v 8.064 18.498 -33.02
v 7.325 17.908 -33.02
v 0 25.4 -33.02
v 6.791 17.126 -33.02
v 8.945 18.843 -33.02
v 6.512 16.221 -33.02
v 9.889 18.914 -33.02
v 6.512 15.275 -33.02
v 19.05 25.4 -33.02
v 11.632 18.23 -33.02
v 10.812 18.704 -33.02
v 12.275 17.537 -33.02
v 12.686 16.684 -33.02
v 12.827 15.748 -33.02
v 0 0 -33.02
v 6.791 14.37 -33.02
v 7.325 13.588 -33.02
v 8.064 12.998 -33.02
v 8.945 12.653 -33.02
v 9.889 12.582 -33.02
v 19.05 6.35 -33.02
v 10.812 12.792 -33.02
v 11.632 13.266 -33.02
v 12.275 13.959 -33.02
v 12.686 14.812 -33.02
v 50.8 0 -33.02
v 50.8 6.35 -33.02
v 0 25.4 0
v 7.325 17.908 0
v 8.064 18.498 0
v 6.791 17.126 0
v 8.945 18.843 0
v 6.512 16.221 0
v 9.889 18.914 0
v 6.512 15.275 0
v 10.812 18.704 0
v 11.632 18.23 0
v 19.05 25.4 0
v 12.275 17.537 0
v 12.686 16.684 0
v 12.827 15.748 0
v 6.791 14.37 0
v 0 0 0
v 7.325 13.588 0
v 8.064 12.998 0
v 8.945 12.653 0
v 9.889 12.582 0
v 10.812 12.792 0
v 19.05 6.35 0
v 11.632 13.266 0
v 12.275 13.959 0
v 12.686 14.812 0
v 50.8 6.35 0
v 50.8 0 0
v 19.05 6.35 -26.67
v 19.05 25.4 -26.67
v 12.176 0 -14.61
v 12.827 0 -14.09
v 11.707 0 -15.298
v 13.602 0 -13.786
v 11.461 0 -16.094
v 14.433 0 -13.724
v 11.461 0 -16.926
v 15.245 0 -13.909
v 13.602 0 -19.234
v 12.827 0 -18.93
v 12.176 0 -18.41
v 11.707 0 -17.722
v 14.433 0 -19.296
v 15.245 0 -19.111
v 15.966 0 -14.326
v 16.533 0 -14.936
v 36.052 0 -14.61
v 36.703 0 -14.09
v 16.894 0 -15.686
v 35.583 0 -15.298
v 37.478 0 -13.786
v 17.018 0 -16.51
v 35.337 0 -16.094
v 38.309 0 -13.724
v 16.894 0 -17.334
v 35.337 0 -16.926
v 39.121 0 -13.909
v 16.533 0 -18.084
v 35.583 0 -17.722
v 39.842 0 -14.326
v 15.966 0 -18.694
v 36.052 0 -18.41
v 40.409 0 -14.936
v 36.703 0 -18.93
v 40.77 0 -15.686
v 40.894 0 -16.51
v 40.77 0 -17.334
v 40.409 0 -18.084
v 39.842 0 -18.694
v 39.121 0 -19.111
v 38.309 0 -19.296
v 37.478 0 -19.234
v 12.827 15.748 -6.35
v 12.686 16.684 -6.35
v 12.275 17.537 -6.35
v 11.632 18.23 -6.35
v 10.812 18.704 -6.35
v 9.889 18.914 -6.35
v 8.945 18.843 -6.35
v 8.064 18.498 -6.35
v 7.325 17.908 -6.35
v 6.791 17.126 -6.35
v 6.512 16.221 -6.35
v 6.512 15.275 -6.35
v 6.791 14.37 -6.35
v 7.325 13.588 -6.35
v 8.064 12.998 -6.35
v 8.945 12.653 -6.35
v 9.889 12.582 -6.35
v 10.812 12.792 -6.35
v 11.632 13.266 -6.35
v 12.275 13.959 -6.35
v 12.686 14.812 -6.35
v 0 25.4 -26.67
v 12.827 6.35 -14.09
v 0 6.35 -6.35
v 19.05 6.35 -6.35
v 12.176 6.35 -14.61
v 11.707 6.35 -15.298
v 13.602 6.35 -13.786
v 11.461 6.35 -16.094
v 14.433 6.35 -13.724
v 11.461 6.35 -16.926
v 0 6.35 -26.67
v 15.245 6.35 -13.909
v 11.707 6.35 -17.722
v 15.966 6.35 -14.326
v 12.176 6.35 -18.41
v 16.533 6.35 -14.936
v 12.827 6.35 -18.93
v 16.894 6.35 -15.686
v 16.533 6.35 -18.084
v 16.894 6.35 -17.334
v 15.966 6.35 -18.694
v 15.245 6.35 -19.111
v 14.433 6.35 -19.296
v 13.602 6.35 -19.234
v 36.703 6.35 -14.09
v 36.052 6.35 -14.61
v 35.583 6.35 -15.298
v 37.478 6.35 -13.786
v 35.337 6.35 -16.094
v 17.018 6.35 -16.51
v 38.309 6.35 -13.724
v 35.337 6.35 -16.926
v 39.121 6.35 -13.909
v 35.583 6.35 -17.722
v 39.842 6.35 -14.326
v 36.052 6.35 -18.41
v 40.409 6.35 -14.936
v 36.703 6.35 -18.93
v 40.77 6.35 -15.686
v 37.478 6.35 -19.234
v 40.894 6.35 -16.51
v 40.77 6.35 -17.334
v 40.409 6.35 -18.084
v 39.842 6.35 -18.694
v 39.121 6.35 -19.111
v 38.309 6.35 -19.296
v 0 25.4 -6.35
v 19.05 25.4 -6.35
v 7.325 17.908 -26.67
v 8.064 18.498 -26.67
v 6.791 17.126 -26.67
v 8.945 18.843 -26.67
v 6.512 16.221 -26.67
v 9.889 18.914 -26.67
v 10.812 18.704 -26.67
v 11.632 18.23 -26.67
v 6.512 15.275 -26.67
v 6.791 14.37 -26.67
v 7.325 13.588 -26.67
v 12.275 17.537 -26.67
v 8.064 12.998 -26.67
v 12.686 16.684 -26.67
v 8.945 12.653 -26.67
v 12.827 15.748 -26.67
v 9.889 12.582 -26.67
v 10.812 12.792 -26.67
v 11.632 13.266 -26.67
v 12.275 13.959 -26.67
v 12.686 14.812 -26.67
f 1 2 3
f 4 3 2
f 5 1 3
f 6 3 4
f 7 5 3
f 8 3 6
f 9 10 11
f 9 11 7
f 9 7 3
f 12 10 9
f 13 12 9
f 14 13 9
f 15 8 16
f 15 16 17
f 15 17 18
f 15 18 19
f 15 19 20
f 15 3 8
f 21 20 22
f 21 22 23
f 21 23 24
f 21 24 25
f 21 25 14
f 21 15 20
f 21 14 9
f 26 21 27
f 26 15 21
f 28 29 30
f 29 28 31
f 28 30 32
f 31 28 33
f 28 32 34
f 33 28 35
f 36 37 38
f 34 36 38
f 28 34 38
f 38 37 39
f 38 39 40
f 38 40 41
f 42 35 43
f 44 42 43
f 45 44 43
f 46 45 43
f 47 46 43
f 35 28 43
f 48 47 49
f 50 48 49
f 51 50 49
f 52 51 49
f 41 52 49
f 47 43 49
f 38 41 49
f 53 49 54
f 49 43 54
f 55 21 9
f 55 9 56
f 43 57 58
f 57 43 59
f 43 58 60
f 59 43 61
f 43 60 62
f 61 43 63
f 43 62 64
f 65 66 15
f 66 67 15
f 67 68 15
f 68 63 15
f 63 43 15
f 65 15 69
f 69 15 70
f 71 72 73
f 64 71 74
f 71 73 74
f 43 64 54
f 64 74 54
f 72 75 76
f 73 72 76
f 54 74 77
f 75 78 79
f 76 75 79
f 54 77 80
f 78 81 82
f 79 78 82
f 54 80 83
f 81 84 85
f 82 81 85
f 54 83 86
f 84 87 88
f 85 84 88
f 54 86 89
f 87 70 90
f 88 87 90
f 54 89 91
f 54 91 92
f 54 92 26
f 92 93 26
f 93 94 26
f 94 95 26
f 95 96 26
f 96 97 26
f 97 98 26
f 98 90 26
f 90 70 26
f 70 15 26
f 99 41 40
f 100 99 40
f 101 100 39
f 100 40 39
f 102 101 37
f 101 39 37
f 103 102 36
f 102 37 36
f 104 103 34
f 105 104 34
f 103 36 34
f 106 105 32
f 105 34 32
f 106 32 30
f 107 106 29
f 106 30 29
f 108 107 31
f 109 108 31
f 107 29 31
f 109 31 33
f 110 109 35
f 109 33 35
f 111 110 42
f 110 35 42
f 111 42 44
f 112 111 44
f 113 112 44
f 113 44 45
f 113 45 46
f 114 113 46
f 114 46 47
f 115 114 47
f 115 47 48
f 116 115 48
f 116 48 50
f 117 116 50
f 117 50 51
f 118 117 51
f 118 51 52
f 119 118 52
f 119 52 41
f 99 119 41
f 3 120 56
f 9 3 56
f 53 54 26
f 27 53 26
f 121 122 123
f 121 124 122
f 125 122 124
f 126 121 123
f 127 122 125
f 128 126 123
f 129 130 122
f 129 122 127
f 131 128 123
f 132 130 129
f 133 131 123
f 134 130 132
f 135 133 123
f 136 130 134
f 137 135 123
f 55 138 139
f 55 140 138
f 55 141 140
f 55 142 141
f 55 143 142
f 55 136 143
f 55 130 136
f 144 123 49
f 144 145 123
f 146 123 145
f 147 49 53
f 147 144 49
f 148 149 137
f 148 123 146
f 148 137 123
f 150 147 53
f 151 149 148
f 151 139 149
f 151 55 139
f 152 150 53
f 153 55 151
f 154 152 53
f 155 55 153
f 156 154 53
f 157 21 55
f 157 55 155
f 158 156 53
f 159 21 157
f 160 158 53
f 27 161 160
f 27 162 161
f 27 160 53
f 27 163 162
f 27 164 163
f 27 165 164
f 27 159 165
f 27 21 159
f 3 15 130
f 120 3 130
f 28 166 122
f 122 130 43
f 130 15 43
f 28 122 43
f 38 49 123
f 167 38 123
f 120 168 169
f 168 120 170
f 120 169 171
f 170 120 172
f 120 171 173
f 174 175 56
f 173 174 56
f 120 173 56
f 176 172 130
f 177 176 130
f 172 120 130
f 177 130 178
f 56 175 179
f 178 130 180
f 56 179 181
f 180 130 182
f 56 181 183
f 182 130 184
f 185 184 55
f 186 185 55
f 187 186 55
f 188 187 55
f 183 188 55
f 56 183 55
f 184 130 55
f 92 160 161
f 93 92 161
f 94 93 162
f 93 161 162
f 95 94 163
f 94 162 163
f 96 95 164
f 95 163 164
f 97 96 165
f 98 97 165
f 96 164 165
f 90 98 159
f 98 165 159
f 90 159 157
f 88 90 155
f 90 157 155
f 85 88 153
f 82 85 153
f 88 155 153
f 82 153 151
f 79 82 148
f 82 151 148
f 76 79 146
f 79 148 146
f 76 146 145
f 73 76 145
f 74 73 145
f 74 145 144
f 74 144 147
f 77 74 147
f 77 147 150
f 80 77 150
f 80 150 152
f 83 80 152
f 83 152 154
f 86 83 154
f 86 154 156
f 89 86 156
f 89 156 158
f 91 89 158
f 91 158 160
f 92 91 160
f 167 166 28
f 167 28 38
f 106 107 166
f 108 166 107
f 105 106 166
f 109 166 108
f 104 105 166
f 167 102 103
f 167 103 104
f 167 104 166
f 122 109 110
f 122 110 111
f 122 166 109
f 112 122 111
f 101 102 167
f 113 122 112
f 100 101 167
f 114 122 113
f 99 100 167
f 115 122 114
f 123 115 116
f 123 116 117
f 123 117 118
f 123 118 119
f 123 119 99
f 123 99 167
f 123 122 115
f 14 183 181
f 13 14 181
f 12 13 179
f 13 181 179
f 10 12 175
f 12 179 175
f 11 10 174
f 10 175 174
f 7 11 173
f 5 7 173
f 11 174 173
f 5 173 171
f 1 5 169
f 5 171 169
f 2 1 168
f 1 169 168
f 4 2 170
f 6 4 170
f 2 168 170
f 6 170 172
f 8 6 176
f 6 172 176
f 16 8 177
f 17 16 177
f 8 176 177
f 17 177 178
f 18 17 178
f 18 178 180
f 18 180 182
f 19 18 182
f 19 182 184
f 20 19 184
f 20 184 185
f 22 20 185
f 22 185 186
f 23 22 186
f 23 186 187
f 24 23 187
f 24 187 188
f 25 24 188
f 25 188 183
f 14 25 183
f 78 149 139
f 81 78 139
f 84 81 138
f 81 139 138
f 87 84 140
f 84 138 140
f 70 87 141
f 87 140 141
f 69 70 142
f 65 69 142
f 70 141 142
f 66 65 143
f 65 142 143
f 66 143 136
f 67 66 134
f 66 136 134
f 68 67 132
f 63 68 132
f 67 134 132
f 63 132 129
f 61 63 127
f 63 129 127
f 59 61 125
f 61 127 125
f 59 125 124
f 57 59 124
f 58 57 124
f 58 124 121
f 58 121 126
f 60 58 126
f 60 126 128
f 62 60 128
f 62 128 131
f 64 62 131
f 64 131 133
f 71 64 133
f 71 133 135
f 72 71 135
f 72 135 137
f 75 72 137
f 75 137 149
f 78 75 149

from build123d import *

# Parameters (mm, degrees)
SKETCH3_W           = 50.8
SKETCH3_H           = 33.02
BOSS_EXTRUDE2_DEPTH = 6.35
SKETCH4_R           = 2.794
CUT_EXTRUDE1_DEPTH  = 7.35
SKETCH5_W           = 19.05
SKETCH5_H           = 6.35
BOSS_EXTRUDE3_DEPTH = 19.05
SKETCH7_R           = 3.175
CUT_EXTRUDE2_DEPTH  = 34.29


with BuildPart() as part:
    # Sketch3 → Boss-Extrude2 (new body)
    with BuildSketch(Plane(origin=(0, 0, 0), x_dir=(1, 0, 0), z_dir=(0, 1, 0))):
        with Locations((25.4, 16.51)):
            Rectangle(SKETCH3_W, SKETCH3_H)
    extrude(amount=BOSS_EXTRUDE2_DEPTH)

    # Sketch4 → Cut-Extrude1 (cut, through all)
    with BuildSketch(Plane(origin=(0, 6.35, 0), x_dir=(1, 0, 0), z_dir=(0, 1, 0))):
        with Locations((14.224, 16.51)):
            Circle(SKETCH4_R)
        with Locations((38.1, 16.51)):
            Circle(SKETCH4_R)
    extrude(amount=-CUT_EXTRUDE1_DEPTH, mode=Mode.SUBTRACT)

    # Sketch5 → Boss-Extrude3 (add)
    with BuildSketch(Plane(origin=(0, 6.35, 0), x_dir=(1, 0, 0), z_dir=(0, 1, 0))):
        with Locations((9.525, 3.175)):
            Rectangle(SKETCH5_W, SKETCH5_H)
    boss_extrude3 = extrude(amount=BOSS_EXTRUDE3_DEPTH)

    # Mirror1: Boss-Extrude3 across plane
    add(boss_extrude3.mirror(Plane.XY.offset(-16.51)))

    # Sketch7 → Cut-Extrude2 (cut)
    with BuildSketch(Plane.XY):
        with Locations((9.652, 15.748)):
            Circle(SKETCH7_R)
    extrude(amount=-CUT_EXTRUDE2_DEPTH, mode=Mode.SUBTRACT)


solid = part.part
